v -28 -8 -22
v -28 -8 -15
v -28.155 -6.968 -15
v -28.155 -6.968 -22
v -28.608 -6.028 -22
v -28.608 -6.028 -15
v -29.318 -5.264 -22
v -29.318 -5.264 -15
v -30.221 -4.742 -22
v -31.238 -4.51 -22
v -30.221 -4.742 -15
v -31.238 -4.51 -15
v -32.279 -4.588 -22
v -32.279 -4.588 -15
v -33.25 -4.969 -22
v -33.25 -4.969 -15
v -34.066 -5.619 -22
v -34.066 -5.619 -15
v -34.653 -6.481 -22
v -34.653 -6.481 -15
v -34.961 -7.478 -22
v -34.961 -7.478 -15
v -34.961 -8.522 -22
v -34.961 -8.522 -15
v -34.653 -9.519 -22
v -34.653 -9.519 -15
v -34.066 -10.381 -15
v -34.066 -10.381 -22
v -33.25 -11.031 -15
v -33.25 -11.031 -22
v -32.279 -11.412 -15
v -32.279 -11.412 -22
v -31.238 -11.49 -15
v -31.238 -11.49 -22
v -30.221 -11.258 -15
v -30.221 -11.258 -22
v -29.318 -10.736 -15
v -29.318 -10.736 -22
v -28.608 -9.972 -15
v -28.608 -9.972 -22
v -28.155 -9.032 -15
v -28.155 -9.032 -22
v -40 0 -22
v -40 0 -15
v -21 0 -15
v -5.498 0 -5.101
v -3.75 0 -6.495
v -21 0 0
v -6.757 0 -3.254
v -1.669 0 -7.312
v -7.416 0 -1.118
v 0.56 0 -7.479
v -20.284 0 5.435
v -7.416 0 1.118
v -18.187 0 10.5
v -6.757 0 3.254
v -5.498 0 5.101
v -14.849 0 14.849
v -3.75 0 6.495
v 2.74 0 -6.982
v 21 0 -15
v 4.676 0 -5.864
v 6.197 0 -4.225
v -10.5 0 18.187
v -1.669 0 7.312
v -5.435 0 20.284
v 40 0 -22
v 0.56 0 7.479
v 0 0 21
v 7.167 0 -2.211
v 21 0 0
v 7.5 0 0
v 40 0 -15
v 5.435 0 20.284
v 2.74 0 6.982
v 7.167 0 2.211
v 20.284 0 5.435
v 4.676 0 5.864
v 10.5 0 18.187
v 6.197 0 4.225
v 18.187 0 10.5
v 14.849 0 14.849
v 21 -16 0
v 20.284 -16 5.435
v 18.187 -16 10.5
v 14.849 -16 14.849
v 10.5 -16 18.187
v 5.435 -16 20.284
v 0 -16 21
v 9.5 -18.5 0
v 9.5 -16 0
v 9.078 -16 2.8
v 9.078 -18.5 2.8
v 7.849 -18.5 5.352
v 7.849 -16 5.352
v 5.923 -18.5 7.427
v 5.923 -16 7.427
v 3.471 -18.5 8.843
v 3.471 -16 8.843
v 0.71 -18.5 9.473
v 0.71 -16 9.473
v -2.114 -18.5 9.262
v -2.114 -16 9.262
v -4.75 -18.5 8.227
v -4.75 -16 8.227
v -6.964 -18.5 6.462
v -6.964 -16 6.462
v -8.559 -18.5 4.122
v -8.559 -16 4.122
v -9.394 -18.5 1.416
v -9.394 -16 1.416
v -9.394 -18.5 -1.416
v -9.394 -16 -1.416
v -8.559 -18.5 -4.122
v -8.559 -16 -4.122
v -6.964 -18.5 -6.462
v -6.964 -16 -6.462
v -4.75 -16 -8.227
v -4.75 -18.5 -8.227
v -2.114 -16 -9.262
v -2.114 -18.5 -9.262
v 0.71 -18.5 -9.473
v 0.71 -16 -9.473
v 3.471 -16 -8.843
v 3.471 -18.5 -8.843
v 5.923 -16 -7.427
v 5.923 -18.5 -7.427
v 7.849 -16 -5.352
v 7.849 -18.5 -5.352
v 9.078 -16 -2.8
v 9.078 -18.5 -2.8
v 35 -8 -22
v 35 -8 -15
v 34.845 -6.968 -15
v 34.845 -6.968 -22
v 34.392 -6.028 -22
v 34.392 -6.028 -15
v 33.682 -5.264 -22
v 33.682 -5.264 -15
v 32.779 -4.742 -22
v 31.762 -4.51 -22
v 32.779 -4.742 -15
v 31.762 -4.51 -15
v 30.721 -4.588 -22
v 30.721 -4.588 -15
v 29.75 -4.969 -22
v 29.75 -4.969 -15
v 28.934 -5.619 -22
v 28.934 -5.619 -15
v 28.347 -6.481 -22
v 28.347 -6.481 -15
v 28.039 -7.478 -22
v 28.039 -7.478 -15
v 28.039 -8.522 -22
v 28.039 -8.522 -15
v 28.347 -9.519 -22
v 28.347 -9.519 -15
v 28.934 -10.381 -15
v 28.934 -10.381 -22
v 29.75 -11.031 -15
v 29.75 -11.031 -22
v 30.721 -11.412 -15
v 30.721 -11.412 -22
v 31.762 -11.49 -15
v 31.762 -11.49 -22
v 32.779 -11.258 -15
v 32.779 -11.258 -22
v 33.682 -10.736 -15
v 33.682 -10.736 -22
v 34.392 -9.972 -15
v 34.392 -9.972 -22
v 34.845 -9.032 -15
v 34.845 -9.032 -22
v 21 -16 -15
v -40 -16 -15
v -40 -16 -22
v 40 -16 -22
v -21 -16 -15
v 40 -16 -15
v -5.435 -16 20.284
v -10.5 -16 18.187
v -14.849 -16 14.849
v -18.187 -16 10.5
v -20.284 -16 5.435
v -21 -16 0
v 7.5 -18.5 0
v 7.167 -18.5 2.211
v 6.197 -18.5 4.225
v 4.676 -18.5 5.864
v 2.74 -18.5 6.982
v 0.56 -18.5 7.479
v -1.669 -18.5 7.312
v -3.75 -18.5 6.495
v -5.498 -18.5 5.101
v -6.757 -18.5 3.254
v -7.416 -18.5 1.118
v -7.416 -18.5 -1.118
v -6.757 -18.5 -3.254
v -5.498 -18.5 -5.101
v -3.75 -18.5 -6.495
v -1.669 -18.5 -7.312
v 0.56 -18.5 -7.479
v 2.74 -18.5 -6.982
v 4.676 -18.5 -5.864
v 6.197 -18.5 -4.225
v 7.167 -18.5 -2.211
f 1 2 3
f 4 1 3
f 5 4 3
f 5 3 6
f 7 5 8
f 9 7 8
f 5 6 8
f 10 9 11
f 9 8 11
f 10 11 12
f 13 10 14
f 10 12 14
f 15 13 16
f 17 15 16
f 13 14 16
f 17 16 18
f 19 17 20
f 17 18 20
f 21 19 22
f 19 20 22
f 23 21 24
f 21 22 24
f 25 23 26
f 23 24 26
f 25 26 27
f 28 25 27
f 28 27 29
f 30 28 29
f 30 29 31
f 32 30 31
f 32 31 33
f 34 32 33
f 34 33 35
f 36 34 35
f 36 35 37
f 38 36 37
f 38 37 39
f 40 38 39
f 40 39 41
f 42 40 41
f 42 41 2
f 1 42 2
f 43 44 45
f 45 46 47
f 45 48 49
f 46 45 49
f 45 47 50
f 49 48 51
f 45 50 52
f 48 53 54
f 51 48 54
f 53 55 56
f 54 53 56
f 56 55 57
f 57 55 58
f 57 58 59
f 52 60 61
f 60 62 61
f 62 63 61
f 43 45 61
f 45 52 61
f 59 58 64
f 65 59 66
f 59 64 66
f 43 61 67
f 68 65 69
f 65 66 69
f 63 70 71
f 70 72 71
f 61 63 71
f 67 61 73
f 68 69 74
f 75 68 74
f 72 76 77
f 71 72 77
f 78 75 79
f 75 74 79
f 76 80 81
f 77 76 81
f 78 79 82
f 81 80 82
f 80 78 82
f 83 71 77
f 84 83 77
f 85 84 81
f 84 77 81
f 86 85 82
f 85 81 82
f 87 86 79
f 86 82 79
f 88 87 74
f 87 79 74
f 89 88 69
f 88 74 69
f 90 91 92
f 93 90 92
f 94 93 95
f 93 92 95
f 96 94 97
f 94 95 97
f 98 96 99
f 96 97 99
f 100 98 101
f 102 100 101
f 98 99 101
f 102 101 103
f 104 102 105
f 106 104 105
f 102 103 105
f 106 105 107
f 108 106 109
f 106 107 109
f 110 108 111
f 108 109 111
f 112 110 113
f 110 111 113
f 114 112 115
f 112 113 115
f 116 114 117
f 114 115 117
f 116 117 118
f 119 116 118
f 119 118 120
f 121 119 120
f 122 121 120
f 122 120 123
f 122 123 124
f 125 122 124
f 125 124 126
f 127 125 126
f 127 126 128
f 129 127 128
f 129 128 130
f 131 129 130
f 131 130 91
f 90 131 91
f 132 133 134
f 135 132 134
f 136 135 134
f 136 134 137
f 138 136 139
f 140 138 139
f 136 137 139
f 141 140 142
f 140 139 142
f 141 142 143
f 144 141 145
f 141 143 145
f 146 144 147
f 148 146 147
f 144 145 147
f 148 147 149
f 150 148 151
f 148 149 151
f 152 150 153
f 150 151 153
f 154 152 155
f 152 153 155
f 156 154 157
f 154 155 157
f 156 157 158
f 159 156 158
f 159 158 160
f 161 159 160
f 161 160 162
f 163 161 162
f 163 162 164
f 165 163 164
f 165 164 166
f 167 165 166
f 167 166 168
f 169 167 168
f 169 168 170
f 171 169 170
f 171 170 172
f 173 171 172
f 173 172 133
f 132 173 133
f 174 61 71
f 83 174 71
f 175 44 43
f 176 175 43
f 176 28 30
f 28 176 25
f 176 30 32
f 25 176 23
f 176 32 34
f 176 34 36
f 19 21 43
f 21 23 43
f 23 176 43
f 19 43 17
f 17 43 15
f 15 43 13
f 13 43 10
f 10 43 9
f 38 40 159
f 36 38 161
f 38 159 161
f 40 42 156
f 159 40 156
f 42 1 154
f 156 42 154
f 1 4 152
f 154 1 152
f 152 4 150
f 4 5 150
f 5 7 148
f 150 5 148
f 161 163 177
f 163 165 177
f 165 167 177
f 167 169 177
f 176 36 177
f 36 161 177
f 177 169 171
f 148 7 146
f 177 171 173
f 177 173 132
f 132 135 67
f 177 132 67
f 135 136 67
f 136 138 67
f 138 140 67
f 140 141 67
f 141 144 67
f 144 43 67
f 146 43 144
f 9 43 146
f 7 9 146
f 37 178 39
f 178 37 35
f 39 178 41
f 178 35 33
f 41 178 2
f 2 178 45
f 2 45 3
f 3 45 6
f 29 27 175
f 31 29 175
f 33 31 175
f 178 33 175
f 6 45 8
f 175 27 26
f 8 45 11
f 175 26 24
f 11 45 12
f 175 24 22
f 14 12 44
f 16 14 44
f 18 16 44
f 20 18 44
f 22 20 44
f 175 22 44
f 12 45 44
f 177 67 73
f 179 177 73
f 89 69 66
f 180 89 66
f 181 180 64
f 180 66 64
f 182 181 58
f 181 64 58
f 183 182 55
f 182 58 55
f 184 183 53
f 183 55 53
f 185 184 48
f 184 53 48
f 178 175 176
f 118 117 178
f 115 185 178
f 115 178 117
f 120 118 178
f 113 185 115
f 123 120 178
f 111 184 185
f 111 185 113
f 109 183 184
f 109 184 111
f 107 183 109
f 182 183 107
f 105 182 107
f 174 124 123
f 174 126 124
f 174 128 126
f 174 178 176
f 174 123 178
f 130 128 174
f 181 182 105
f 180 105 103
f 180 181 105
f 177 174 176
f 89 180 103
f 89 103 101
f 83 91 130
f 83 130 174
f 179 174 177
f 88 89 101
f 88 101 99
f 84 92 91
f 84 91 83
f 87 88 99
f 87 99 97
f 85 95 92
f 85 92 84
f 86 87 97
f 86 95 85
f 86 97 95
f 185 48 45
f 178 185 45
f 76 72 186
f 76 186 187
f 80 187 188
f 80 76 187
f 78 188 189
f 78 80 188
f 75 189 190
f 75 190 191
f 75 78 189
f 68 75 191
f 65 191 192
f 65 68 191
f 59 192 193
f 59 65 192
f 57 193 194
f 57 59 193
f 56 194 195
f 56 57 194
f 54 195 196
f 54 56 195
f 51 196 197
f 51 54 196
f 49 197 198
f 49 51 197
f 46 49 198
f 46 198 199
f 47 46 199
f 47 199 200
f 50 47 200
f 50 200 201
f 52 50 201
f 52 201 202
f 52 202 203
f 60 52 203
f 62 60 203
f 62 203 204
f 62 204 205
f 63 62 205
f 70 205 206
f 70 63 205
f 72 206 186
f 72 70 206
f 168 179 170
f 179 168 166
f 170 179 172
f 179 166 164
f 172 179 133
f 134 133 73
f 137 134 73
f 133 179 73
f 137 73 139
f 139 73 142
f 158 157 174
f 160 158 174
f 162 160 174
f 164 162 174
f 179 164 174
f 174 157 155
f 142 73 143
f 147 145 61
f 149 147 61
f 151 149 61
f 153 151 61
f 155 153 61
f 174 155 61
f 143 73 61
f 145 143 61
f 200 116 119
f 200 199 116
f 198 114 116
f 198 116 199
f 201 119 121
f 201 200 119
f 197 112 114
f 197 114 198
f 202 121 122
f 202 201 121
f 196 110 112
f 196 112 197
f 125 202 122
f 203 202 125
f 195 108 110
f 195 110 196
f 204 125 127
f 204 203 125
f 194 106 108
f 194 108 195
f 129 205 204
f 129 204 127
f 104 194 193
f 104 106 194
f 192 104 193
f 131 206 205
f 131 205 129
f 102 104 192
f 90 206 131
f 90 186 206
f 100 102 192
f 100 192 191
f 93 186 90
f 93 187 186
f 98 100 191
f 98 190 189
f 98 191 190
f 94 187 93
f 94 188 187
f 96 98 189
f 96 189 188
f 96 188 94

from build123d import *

# Parameters (mm, degrees)
F0_R     = 9.5
F0_R_2   = 7.5
F1_DEPTH = 18.5
F2_DEPTH = 16
F3_R     = 3.5
F4_DEPTH = 7.001


with BuildPart() as f1:
    # F0 (on Front) → F1 (new body)
    with BuildSketch(Plane.XZ):
        Circle(F0_R)
        Circle(F0_R_2, mode=Mode.SUBTRACT)
    extrude(amount=F1_DEPTH)

    # F0 (on Front) → F2 (join)
    with BuildSketch(Plane.XZ):
        with BuildLine():
            Line((-40, -22), (0, -22))
            Line((0, -22), (40, -22))
            Line((40, -22), (40, -15))
            Line((40, -15), (21, -15))
            Line((21, -15), (21, 0))
            ThreePointArc((21, 0), (14.849242, 14.849242), (0, 21))
            ThreePointArc((0, 21), (-14.849242, 14.849242), (-21, 0))
            Line((-21, 0), (-21, -15))
            Line((-21, -15), (-40, -15))
            Line((-40, -15), (-40, -22))
        make_face()
        Circle(F0_R, mode=Mode.SUBTRACT)
    extrude(amount=F2_DEPTH)

    # F3 (on face) → F4 (cut, through all)
    with BuildSketch(Plane.XY.offset(-15)):
        with Locations((-31.5, -8)):
            Circle(F3_R)
        with Locations((31.5, -8)):
            Circle(F3_R)
    extrude(amount=-F4_DEPTH, mode=Mode.SUBTRACT)


solid = f1.part
